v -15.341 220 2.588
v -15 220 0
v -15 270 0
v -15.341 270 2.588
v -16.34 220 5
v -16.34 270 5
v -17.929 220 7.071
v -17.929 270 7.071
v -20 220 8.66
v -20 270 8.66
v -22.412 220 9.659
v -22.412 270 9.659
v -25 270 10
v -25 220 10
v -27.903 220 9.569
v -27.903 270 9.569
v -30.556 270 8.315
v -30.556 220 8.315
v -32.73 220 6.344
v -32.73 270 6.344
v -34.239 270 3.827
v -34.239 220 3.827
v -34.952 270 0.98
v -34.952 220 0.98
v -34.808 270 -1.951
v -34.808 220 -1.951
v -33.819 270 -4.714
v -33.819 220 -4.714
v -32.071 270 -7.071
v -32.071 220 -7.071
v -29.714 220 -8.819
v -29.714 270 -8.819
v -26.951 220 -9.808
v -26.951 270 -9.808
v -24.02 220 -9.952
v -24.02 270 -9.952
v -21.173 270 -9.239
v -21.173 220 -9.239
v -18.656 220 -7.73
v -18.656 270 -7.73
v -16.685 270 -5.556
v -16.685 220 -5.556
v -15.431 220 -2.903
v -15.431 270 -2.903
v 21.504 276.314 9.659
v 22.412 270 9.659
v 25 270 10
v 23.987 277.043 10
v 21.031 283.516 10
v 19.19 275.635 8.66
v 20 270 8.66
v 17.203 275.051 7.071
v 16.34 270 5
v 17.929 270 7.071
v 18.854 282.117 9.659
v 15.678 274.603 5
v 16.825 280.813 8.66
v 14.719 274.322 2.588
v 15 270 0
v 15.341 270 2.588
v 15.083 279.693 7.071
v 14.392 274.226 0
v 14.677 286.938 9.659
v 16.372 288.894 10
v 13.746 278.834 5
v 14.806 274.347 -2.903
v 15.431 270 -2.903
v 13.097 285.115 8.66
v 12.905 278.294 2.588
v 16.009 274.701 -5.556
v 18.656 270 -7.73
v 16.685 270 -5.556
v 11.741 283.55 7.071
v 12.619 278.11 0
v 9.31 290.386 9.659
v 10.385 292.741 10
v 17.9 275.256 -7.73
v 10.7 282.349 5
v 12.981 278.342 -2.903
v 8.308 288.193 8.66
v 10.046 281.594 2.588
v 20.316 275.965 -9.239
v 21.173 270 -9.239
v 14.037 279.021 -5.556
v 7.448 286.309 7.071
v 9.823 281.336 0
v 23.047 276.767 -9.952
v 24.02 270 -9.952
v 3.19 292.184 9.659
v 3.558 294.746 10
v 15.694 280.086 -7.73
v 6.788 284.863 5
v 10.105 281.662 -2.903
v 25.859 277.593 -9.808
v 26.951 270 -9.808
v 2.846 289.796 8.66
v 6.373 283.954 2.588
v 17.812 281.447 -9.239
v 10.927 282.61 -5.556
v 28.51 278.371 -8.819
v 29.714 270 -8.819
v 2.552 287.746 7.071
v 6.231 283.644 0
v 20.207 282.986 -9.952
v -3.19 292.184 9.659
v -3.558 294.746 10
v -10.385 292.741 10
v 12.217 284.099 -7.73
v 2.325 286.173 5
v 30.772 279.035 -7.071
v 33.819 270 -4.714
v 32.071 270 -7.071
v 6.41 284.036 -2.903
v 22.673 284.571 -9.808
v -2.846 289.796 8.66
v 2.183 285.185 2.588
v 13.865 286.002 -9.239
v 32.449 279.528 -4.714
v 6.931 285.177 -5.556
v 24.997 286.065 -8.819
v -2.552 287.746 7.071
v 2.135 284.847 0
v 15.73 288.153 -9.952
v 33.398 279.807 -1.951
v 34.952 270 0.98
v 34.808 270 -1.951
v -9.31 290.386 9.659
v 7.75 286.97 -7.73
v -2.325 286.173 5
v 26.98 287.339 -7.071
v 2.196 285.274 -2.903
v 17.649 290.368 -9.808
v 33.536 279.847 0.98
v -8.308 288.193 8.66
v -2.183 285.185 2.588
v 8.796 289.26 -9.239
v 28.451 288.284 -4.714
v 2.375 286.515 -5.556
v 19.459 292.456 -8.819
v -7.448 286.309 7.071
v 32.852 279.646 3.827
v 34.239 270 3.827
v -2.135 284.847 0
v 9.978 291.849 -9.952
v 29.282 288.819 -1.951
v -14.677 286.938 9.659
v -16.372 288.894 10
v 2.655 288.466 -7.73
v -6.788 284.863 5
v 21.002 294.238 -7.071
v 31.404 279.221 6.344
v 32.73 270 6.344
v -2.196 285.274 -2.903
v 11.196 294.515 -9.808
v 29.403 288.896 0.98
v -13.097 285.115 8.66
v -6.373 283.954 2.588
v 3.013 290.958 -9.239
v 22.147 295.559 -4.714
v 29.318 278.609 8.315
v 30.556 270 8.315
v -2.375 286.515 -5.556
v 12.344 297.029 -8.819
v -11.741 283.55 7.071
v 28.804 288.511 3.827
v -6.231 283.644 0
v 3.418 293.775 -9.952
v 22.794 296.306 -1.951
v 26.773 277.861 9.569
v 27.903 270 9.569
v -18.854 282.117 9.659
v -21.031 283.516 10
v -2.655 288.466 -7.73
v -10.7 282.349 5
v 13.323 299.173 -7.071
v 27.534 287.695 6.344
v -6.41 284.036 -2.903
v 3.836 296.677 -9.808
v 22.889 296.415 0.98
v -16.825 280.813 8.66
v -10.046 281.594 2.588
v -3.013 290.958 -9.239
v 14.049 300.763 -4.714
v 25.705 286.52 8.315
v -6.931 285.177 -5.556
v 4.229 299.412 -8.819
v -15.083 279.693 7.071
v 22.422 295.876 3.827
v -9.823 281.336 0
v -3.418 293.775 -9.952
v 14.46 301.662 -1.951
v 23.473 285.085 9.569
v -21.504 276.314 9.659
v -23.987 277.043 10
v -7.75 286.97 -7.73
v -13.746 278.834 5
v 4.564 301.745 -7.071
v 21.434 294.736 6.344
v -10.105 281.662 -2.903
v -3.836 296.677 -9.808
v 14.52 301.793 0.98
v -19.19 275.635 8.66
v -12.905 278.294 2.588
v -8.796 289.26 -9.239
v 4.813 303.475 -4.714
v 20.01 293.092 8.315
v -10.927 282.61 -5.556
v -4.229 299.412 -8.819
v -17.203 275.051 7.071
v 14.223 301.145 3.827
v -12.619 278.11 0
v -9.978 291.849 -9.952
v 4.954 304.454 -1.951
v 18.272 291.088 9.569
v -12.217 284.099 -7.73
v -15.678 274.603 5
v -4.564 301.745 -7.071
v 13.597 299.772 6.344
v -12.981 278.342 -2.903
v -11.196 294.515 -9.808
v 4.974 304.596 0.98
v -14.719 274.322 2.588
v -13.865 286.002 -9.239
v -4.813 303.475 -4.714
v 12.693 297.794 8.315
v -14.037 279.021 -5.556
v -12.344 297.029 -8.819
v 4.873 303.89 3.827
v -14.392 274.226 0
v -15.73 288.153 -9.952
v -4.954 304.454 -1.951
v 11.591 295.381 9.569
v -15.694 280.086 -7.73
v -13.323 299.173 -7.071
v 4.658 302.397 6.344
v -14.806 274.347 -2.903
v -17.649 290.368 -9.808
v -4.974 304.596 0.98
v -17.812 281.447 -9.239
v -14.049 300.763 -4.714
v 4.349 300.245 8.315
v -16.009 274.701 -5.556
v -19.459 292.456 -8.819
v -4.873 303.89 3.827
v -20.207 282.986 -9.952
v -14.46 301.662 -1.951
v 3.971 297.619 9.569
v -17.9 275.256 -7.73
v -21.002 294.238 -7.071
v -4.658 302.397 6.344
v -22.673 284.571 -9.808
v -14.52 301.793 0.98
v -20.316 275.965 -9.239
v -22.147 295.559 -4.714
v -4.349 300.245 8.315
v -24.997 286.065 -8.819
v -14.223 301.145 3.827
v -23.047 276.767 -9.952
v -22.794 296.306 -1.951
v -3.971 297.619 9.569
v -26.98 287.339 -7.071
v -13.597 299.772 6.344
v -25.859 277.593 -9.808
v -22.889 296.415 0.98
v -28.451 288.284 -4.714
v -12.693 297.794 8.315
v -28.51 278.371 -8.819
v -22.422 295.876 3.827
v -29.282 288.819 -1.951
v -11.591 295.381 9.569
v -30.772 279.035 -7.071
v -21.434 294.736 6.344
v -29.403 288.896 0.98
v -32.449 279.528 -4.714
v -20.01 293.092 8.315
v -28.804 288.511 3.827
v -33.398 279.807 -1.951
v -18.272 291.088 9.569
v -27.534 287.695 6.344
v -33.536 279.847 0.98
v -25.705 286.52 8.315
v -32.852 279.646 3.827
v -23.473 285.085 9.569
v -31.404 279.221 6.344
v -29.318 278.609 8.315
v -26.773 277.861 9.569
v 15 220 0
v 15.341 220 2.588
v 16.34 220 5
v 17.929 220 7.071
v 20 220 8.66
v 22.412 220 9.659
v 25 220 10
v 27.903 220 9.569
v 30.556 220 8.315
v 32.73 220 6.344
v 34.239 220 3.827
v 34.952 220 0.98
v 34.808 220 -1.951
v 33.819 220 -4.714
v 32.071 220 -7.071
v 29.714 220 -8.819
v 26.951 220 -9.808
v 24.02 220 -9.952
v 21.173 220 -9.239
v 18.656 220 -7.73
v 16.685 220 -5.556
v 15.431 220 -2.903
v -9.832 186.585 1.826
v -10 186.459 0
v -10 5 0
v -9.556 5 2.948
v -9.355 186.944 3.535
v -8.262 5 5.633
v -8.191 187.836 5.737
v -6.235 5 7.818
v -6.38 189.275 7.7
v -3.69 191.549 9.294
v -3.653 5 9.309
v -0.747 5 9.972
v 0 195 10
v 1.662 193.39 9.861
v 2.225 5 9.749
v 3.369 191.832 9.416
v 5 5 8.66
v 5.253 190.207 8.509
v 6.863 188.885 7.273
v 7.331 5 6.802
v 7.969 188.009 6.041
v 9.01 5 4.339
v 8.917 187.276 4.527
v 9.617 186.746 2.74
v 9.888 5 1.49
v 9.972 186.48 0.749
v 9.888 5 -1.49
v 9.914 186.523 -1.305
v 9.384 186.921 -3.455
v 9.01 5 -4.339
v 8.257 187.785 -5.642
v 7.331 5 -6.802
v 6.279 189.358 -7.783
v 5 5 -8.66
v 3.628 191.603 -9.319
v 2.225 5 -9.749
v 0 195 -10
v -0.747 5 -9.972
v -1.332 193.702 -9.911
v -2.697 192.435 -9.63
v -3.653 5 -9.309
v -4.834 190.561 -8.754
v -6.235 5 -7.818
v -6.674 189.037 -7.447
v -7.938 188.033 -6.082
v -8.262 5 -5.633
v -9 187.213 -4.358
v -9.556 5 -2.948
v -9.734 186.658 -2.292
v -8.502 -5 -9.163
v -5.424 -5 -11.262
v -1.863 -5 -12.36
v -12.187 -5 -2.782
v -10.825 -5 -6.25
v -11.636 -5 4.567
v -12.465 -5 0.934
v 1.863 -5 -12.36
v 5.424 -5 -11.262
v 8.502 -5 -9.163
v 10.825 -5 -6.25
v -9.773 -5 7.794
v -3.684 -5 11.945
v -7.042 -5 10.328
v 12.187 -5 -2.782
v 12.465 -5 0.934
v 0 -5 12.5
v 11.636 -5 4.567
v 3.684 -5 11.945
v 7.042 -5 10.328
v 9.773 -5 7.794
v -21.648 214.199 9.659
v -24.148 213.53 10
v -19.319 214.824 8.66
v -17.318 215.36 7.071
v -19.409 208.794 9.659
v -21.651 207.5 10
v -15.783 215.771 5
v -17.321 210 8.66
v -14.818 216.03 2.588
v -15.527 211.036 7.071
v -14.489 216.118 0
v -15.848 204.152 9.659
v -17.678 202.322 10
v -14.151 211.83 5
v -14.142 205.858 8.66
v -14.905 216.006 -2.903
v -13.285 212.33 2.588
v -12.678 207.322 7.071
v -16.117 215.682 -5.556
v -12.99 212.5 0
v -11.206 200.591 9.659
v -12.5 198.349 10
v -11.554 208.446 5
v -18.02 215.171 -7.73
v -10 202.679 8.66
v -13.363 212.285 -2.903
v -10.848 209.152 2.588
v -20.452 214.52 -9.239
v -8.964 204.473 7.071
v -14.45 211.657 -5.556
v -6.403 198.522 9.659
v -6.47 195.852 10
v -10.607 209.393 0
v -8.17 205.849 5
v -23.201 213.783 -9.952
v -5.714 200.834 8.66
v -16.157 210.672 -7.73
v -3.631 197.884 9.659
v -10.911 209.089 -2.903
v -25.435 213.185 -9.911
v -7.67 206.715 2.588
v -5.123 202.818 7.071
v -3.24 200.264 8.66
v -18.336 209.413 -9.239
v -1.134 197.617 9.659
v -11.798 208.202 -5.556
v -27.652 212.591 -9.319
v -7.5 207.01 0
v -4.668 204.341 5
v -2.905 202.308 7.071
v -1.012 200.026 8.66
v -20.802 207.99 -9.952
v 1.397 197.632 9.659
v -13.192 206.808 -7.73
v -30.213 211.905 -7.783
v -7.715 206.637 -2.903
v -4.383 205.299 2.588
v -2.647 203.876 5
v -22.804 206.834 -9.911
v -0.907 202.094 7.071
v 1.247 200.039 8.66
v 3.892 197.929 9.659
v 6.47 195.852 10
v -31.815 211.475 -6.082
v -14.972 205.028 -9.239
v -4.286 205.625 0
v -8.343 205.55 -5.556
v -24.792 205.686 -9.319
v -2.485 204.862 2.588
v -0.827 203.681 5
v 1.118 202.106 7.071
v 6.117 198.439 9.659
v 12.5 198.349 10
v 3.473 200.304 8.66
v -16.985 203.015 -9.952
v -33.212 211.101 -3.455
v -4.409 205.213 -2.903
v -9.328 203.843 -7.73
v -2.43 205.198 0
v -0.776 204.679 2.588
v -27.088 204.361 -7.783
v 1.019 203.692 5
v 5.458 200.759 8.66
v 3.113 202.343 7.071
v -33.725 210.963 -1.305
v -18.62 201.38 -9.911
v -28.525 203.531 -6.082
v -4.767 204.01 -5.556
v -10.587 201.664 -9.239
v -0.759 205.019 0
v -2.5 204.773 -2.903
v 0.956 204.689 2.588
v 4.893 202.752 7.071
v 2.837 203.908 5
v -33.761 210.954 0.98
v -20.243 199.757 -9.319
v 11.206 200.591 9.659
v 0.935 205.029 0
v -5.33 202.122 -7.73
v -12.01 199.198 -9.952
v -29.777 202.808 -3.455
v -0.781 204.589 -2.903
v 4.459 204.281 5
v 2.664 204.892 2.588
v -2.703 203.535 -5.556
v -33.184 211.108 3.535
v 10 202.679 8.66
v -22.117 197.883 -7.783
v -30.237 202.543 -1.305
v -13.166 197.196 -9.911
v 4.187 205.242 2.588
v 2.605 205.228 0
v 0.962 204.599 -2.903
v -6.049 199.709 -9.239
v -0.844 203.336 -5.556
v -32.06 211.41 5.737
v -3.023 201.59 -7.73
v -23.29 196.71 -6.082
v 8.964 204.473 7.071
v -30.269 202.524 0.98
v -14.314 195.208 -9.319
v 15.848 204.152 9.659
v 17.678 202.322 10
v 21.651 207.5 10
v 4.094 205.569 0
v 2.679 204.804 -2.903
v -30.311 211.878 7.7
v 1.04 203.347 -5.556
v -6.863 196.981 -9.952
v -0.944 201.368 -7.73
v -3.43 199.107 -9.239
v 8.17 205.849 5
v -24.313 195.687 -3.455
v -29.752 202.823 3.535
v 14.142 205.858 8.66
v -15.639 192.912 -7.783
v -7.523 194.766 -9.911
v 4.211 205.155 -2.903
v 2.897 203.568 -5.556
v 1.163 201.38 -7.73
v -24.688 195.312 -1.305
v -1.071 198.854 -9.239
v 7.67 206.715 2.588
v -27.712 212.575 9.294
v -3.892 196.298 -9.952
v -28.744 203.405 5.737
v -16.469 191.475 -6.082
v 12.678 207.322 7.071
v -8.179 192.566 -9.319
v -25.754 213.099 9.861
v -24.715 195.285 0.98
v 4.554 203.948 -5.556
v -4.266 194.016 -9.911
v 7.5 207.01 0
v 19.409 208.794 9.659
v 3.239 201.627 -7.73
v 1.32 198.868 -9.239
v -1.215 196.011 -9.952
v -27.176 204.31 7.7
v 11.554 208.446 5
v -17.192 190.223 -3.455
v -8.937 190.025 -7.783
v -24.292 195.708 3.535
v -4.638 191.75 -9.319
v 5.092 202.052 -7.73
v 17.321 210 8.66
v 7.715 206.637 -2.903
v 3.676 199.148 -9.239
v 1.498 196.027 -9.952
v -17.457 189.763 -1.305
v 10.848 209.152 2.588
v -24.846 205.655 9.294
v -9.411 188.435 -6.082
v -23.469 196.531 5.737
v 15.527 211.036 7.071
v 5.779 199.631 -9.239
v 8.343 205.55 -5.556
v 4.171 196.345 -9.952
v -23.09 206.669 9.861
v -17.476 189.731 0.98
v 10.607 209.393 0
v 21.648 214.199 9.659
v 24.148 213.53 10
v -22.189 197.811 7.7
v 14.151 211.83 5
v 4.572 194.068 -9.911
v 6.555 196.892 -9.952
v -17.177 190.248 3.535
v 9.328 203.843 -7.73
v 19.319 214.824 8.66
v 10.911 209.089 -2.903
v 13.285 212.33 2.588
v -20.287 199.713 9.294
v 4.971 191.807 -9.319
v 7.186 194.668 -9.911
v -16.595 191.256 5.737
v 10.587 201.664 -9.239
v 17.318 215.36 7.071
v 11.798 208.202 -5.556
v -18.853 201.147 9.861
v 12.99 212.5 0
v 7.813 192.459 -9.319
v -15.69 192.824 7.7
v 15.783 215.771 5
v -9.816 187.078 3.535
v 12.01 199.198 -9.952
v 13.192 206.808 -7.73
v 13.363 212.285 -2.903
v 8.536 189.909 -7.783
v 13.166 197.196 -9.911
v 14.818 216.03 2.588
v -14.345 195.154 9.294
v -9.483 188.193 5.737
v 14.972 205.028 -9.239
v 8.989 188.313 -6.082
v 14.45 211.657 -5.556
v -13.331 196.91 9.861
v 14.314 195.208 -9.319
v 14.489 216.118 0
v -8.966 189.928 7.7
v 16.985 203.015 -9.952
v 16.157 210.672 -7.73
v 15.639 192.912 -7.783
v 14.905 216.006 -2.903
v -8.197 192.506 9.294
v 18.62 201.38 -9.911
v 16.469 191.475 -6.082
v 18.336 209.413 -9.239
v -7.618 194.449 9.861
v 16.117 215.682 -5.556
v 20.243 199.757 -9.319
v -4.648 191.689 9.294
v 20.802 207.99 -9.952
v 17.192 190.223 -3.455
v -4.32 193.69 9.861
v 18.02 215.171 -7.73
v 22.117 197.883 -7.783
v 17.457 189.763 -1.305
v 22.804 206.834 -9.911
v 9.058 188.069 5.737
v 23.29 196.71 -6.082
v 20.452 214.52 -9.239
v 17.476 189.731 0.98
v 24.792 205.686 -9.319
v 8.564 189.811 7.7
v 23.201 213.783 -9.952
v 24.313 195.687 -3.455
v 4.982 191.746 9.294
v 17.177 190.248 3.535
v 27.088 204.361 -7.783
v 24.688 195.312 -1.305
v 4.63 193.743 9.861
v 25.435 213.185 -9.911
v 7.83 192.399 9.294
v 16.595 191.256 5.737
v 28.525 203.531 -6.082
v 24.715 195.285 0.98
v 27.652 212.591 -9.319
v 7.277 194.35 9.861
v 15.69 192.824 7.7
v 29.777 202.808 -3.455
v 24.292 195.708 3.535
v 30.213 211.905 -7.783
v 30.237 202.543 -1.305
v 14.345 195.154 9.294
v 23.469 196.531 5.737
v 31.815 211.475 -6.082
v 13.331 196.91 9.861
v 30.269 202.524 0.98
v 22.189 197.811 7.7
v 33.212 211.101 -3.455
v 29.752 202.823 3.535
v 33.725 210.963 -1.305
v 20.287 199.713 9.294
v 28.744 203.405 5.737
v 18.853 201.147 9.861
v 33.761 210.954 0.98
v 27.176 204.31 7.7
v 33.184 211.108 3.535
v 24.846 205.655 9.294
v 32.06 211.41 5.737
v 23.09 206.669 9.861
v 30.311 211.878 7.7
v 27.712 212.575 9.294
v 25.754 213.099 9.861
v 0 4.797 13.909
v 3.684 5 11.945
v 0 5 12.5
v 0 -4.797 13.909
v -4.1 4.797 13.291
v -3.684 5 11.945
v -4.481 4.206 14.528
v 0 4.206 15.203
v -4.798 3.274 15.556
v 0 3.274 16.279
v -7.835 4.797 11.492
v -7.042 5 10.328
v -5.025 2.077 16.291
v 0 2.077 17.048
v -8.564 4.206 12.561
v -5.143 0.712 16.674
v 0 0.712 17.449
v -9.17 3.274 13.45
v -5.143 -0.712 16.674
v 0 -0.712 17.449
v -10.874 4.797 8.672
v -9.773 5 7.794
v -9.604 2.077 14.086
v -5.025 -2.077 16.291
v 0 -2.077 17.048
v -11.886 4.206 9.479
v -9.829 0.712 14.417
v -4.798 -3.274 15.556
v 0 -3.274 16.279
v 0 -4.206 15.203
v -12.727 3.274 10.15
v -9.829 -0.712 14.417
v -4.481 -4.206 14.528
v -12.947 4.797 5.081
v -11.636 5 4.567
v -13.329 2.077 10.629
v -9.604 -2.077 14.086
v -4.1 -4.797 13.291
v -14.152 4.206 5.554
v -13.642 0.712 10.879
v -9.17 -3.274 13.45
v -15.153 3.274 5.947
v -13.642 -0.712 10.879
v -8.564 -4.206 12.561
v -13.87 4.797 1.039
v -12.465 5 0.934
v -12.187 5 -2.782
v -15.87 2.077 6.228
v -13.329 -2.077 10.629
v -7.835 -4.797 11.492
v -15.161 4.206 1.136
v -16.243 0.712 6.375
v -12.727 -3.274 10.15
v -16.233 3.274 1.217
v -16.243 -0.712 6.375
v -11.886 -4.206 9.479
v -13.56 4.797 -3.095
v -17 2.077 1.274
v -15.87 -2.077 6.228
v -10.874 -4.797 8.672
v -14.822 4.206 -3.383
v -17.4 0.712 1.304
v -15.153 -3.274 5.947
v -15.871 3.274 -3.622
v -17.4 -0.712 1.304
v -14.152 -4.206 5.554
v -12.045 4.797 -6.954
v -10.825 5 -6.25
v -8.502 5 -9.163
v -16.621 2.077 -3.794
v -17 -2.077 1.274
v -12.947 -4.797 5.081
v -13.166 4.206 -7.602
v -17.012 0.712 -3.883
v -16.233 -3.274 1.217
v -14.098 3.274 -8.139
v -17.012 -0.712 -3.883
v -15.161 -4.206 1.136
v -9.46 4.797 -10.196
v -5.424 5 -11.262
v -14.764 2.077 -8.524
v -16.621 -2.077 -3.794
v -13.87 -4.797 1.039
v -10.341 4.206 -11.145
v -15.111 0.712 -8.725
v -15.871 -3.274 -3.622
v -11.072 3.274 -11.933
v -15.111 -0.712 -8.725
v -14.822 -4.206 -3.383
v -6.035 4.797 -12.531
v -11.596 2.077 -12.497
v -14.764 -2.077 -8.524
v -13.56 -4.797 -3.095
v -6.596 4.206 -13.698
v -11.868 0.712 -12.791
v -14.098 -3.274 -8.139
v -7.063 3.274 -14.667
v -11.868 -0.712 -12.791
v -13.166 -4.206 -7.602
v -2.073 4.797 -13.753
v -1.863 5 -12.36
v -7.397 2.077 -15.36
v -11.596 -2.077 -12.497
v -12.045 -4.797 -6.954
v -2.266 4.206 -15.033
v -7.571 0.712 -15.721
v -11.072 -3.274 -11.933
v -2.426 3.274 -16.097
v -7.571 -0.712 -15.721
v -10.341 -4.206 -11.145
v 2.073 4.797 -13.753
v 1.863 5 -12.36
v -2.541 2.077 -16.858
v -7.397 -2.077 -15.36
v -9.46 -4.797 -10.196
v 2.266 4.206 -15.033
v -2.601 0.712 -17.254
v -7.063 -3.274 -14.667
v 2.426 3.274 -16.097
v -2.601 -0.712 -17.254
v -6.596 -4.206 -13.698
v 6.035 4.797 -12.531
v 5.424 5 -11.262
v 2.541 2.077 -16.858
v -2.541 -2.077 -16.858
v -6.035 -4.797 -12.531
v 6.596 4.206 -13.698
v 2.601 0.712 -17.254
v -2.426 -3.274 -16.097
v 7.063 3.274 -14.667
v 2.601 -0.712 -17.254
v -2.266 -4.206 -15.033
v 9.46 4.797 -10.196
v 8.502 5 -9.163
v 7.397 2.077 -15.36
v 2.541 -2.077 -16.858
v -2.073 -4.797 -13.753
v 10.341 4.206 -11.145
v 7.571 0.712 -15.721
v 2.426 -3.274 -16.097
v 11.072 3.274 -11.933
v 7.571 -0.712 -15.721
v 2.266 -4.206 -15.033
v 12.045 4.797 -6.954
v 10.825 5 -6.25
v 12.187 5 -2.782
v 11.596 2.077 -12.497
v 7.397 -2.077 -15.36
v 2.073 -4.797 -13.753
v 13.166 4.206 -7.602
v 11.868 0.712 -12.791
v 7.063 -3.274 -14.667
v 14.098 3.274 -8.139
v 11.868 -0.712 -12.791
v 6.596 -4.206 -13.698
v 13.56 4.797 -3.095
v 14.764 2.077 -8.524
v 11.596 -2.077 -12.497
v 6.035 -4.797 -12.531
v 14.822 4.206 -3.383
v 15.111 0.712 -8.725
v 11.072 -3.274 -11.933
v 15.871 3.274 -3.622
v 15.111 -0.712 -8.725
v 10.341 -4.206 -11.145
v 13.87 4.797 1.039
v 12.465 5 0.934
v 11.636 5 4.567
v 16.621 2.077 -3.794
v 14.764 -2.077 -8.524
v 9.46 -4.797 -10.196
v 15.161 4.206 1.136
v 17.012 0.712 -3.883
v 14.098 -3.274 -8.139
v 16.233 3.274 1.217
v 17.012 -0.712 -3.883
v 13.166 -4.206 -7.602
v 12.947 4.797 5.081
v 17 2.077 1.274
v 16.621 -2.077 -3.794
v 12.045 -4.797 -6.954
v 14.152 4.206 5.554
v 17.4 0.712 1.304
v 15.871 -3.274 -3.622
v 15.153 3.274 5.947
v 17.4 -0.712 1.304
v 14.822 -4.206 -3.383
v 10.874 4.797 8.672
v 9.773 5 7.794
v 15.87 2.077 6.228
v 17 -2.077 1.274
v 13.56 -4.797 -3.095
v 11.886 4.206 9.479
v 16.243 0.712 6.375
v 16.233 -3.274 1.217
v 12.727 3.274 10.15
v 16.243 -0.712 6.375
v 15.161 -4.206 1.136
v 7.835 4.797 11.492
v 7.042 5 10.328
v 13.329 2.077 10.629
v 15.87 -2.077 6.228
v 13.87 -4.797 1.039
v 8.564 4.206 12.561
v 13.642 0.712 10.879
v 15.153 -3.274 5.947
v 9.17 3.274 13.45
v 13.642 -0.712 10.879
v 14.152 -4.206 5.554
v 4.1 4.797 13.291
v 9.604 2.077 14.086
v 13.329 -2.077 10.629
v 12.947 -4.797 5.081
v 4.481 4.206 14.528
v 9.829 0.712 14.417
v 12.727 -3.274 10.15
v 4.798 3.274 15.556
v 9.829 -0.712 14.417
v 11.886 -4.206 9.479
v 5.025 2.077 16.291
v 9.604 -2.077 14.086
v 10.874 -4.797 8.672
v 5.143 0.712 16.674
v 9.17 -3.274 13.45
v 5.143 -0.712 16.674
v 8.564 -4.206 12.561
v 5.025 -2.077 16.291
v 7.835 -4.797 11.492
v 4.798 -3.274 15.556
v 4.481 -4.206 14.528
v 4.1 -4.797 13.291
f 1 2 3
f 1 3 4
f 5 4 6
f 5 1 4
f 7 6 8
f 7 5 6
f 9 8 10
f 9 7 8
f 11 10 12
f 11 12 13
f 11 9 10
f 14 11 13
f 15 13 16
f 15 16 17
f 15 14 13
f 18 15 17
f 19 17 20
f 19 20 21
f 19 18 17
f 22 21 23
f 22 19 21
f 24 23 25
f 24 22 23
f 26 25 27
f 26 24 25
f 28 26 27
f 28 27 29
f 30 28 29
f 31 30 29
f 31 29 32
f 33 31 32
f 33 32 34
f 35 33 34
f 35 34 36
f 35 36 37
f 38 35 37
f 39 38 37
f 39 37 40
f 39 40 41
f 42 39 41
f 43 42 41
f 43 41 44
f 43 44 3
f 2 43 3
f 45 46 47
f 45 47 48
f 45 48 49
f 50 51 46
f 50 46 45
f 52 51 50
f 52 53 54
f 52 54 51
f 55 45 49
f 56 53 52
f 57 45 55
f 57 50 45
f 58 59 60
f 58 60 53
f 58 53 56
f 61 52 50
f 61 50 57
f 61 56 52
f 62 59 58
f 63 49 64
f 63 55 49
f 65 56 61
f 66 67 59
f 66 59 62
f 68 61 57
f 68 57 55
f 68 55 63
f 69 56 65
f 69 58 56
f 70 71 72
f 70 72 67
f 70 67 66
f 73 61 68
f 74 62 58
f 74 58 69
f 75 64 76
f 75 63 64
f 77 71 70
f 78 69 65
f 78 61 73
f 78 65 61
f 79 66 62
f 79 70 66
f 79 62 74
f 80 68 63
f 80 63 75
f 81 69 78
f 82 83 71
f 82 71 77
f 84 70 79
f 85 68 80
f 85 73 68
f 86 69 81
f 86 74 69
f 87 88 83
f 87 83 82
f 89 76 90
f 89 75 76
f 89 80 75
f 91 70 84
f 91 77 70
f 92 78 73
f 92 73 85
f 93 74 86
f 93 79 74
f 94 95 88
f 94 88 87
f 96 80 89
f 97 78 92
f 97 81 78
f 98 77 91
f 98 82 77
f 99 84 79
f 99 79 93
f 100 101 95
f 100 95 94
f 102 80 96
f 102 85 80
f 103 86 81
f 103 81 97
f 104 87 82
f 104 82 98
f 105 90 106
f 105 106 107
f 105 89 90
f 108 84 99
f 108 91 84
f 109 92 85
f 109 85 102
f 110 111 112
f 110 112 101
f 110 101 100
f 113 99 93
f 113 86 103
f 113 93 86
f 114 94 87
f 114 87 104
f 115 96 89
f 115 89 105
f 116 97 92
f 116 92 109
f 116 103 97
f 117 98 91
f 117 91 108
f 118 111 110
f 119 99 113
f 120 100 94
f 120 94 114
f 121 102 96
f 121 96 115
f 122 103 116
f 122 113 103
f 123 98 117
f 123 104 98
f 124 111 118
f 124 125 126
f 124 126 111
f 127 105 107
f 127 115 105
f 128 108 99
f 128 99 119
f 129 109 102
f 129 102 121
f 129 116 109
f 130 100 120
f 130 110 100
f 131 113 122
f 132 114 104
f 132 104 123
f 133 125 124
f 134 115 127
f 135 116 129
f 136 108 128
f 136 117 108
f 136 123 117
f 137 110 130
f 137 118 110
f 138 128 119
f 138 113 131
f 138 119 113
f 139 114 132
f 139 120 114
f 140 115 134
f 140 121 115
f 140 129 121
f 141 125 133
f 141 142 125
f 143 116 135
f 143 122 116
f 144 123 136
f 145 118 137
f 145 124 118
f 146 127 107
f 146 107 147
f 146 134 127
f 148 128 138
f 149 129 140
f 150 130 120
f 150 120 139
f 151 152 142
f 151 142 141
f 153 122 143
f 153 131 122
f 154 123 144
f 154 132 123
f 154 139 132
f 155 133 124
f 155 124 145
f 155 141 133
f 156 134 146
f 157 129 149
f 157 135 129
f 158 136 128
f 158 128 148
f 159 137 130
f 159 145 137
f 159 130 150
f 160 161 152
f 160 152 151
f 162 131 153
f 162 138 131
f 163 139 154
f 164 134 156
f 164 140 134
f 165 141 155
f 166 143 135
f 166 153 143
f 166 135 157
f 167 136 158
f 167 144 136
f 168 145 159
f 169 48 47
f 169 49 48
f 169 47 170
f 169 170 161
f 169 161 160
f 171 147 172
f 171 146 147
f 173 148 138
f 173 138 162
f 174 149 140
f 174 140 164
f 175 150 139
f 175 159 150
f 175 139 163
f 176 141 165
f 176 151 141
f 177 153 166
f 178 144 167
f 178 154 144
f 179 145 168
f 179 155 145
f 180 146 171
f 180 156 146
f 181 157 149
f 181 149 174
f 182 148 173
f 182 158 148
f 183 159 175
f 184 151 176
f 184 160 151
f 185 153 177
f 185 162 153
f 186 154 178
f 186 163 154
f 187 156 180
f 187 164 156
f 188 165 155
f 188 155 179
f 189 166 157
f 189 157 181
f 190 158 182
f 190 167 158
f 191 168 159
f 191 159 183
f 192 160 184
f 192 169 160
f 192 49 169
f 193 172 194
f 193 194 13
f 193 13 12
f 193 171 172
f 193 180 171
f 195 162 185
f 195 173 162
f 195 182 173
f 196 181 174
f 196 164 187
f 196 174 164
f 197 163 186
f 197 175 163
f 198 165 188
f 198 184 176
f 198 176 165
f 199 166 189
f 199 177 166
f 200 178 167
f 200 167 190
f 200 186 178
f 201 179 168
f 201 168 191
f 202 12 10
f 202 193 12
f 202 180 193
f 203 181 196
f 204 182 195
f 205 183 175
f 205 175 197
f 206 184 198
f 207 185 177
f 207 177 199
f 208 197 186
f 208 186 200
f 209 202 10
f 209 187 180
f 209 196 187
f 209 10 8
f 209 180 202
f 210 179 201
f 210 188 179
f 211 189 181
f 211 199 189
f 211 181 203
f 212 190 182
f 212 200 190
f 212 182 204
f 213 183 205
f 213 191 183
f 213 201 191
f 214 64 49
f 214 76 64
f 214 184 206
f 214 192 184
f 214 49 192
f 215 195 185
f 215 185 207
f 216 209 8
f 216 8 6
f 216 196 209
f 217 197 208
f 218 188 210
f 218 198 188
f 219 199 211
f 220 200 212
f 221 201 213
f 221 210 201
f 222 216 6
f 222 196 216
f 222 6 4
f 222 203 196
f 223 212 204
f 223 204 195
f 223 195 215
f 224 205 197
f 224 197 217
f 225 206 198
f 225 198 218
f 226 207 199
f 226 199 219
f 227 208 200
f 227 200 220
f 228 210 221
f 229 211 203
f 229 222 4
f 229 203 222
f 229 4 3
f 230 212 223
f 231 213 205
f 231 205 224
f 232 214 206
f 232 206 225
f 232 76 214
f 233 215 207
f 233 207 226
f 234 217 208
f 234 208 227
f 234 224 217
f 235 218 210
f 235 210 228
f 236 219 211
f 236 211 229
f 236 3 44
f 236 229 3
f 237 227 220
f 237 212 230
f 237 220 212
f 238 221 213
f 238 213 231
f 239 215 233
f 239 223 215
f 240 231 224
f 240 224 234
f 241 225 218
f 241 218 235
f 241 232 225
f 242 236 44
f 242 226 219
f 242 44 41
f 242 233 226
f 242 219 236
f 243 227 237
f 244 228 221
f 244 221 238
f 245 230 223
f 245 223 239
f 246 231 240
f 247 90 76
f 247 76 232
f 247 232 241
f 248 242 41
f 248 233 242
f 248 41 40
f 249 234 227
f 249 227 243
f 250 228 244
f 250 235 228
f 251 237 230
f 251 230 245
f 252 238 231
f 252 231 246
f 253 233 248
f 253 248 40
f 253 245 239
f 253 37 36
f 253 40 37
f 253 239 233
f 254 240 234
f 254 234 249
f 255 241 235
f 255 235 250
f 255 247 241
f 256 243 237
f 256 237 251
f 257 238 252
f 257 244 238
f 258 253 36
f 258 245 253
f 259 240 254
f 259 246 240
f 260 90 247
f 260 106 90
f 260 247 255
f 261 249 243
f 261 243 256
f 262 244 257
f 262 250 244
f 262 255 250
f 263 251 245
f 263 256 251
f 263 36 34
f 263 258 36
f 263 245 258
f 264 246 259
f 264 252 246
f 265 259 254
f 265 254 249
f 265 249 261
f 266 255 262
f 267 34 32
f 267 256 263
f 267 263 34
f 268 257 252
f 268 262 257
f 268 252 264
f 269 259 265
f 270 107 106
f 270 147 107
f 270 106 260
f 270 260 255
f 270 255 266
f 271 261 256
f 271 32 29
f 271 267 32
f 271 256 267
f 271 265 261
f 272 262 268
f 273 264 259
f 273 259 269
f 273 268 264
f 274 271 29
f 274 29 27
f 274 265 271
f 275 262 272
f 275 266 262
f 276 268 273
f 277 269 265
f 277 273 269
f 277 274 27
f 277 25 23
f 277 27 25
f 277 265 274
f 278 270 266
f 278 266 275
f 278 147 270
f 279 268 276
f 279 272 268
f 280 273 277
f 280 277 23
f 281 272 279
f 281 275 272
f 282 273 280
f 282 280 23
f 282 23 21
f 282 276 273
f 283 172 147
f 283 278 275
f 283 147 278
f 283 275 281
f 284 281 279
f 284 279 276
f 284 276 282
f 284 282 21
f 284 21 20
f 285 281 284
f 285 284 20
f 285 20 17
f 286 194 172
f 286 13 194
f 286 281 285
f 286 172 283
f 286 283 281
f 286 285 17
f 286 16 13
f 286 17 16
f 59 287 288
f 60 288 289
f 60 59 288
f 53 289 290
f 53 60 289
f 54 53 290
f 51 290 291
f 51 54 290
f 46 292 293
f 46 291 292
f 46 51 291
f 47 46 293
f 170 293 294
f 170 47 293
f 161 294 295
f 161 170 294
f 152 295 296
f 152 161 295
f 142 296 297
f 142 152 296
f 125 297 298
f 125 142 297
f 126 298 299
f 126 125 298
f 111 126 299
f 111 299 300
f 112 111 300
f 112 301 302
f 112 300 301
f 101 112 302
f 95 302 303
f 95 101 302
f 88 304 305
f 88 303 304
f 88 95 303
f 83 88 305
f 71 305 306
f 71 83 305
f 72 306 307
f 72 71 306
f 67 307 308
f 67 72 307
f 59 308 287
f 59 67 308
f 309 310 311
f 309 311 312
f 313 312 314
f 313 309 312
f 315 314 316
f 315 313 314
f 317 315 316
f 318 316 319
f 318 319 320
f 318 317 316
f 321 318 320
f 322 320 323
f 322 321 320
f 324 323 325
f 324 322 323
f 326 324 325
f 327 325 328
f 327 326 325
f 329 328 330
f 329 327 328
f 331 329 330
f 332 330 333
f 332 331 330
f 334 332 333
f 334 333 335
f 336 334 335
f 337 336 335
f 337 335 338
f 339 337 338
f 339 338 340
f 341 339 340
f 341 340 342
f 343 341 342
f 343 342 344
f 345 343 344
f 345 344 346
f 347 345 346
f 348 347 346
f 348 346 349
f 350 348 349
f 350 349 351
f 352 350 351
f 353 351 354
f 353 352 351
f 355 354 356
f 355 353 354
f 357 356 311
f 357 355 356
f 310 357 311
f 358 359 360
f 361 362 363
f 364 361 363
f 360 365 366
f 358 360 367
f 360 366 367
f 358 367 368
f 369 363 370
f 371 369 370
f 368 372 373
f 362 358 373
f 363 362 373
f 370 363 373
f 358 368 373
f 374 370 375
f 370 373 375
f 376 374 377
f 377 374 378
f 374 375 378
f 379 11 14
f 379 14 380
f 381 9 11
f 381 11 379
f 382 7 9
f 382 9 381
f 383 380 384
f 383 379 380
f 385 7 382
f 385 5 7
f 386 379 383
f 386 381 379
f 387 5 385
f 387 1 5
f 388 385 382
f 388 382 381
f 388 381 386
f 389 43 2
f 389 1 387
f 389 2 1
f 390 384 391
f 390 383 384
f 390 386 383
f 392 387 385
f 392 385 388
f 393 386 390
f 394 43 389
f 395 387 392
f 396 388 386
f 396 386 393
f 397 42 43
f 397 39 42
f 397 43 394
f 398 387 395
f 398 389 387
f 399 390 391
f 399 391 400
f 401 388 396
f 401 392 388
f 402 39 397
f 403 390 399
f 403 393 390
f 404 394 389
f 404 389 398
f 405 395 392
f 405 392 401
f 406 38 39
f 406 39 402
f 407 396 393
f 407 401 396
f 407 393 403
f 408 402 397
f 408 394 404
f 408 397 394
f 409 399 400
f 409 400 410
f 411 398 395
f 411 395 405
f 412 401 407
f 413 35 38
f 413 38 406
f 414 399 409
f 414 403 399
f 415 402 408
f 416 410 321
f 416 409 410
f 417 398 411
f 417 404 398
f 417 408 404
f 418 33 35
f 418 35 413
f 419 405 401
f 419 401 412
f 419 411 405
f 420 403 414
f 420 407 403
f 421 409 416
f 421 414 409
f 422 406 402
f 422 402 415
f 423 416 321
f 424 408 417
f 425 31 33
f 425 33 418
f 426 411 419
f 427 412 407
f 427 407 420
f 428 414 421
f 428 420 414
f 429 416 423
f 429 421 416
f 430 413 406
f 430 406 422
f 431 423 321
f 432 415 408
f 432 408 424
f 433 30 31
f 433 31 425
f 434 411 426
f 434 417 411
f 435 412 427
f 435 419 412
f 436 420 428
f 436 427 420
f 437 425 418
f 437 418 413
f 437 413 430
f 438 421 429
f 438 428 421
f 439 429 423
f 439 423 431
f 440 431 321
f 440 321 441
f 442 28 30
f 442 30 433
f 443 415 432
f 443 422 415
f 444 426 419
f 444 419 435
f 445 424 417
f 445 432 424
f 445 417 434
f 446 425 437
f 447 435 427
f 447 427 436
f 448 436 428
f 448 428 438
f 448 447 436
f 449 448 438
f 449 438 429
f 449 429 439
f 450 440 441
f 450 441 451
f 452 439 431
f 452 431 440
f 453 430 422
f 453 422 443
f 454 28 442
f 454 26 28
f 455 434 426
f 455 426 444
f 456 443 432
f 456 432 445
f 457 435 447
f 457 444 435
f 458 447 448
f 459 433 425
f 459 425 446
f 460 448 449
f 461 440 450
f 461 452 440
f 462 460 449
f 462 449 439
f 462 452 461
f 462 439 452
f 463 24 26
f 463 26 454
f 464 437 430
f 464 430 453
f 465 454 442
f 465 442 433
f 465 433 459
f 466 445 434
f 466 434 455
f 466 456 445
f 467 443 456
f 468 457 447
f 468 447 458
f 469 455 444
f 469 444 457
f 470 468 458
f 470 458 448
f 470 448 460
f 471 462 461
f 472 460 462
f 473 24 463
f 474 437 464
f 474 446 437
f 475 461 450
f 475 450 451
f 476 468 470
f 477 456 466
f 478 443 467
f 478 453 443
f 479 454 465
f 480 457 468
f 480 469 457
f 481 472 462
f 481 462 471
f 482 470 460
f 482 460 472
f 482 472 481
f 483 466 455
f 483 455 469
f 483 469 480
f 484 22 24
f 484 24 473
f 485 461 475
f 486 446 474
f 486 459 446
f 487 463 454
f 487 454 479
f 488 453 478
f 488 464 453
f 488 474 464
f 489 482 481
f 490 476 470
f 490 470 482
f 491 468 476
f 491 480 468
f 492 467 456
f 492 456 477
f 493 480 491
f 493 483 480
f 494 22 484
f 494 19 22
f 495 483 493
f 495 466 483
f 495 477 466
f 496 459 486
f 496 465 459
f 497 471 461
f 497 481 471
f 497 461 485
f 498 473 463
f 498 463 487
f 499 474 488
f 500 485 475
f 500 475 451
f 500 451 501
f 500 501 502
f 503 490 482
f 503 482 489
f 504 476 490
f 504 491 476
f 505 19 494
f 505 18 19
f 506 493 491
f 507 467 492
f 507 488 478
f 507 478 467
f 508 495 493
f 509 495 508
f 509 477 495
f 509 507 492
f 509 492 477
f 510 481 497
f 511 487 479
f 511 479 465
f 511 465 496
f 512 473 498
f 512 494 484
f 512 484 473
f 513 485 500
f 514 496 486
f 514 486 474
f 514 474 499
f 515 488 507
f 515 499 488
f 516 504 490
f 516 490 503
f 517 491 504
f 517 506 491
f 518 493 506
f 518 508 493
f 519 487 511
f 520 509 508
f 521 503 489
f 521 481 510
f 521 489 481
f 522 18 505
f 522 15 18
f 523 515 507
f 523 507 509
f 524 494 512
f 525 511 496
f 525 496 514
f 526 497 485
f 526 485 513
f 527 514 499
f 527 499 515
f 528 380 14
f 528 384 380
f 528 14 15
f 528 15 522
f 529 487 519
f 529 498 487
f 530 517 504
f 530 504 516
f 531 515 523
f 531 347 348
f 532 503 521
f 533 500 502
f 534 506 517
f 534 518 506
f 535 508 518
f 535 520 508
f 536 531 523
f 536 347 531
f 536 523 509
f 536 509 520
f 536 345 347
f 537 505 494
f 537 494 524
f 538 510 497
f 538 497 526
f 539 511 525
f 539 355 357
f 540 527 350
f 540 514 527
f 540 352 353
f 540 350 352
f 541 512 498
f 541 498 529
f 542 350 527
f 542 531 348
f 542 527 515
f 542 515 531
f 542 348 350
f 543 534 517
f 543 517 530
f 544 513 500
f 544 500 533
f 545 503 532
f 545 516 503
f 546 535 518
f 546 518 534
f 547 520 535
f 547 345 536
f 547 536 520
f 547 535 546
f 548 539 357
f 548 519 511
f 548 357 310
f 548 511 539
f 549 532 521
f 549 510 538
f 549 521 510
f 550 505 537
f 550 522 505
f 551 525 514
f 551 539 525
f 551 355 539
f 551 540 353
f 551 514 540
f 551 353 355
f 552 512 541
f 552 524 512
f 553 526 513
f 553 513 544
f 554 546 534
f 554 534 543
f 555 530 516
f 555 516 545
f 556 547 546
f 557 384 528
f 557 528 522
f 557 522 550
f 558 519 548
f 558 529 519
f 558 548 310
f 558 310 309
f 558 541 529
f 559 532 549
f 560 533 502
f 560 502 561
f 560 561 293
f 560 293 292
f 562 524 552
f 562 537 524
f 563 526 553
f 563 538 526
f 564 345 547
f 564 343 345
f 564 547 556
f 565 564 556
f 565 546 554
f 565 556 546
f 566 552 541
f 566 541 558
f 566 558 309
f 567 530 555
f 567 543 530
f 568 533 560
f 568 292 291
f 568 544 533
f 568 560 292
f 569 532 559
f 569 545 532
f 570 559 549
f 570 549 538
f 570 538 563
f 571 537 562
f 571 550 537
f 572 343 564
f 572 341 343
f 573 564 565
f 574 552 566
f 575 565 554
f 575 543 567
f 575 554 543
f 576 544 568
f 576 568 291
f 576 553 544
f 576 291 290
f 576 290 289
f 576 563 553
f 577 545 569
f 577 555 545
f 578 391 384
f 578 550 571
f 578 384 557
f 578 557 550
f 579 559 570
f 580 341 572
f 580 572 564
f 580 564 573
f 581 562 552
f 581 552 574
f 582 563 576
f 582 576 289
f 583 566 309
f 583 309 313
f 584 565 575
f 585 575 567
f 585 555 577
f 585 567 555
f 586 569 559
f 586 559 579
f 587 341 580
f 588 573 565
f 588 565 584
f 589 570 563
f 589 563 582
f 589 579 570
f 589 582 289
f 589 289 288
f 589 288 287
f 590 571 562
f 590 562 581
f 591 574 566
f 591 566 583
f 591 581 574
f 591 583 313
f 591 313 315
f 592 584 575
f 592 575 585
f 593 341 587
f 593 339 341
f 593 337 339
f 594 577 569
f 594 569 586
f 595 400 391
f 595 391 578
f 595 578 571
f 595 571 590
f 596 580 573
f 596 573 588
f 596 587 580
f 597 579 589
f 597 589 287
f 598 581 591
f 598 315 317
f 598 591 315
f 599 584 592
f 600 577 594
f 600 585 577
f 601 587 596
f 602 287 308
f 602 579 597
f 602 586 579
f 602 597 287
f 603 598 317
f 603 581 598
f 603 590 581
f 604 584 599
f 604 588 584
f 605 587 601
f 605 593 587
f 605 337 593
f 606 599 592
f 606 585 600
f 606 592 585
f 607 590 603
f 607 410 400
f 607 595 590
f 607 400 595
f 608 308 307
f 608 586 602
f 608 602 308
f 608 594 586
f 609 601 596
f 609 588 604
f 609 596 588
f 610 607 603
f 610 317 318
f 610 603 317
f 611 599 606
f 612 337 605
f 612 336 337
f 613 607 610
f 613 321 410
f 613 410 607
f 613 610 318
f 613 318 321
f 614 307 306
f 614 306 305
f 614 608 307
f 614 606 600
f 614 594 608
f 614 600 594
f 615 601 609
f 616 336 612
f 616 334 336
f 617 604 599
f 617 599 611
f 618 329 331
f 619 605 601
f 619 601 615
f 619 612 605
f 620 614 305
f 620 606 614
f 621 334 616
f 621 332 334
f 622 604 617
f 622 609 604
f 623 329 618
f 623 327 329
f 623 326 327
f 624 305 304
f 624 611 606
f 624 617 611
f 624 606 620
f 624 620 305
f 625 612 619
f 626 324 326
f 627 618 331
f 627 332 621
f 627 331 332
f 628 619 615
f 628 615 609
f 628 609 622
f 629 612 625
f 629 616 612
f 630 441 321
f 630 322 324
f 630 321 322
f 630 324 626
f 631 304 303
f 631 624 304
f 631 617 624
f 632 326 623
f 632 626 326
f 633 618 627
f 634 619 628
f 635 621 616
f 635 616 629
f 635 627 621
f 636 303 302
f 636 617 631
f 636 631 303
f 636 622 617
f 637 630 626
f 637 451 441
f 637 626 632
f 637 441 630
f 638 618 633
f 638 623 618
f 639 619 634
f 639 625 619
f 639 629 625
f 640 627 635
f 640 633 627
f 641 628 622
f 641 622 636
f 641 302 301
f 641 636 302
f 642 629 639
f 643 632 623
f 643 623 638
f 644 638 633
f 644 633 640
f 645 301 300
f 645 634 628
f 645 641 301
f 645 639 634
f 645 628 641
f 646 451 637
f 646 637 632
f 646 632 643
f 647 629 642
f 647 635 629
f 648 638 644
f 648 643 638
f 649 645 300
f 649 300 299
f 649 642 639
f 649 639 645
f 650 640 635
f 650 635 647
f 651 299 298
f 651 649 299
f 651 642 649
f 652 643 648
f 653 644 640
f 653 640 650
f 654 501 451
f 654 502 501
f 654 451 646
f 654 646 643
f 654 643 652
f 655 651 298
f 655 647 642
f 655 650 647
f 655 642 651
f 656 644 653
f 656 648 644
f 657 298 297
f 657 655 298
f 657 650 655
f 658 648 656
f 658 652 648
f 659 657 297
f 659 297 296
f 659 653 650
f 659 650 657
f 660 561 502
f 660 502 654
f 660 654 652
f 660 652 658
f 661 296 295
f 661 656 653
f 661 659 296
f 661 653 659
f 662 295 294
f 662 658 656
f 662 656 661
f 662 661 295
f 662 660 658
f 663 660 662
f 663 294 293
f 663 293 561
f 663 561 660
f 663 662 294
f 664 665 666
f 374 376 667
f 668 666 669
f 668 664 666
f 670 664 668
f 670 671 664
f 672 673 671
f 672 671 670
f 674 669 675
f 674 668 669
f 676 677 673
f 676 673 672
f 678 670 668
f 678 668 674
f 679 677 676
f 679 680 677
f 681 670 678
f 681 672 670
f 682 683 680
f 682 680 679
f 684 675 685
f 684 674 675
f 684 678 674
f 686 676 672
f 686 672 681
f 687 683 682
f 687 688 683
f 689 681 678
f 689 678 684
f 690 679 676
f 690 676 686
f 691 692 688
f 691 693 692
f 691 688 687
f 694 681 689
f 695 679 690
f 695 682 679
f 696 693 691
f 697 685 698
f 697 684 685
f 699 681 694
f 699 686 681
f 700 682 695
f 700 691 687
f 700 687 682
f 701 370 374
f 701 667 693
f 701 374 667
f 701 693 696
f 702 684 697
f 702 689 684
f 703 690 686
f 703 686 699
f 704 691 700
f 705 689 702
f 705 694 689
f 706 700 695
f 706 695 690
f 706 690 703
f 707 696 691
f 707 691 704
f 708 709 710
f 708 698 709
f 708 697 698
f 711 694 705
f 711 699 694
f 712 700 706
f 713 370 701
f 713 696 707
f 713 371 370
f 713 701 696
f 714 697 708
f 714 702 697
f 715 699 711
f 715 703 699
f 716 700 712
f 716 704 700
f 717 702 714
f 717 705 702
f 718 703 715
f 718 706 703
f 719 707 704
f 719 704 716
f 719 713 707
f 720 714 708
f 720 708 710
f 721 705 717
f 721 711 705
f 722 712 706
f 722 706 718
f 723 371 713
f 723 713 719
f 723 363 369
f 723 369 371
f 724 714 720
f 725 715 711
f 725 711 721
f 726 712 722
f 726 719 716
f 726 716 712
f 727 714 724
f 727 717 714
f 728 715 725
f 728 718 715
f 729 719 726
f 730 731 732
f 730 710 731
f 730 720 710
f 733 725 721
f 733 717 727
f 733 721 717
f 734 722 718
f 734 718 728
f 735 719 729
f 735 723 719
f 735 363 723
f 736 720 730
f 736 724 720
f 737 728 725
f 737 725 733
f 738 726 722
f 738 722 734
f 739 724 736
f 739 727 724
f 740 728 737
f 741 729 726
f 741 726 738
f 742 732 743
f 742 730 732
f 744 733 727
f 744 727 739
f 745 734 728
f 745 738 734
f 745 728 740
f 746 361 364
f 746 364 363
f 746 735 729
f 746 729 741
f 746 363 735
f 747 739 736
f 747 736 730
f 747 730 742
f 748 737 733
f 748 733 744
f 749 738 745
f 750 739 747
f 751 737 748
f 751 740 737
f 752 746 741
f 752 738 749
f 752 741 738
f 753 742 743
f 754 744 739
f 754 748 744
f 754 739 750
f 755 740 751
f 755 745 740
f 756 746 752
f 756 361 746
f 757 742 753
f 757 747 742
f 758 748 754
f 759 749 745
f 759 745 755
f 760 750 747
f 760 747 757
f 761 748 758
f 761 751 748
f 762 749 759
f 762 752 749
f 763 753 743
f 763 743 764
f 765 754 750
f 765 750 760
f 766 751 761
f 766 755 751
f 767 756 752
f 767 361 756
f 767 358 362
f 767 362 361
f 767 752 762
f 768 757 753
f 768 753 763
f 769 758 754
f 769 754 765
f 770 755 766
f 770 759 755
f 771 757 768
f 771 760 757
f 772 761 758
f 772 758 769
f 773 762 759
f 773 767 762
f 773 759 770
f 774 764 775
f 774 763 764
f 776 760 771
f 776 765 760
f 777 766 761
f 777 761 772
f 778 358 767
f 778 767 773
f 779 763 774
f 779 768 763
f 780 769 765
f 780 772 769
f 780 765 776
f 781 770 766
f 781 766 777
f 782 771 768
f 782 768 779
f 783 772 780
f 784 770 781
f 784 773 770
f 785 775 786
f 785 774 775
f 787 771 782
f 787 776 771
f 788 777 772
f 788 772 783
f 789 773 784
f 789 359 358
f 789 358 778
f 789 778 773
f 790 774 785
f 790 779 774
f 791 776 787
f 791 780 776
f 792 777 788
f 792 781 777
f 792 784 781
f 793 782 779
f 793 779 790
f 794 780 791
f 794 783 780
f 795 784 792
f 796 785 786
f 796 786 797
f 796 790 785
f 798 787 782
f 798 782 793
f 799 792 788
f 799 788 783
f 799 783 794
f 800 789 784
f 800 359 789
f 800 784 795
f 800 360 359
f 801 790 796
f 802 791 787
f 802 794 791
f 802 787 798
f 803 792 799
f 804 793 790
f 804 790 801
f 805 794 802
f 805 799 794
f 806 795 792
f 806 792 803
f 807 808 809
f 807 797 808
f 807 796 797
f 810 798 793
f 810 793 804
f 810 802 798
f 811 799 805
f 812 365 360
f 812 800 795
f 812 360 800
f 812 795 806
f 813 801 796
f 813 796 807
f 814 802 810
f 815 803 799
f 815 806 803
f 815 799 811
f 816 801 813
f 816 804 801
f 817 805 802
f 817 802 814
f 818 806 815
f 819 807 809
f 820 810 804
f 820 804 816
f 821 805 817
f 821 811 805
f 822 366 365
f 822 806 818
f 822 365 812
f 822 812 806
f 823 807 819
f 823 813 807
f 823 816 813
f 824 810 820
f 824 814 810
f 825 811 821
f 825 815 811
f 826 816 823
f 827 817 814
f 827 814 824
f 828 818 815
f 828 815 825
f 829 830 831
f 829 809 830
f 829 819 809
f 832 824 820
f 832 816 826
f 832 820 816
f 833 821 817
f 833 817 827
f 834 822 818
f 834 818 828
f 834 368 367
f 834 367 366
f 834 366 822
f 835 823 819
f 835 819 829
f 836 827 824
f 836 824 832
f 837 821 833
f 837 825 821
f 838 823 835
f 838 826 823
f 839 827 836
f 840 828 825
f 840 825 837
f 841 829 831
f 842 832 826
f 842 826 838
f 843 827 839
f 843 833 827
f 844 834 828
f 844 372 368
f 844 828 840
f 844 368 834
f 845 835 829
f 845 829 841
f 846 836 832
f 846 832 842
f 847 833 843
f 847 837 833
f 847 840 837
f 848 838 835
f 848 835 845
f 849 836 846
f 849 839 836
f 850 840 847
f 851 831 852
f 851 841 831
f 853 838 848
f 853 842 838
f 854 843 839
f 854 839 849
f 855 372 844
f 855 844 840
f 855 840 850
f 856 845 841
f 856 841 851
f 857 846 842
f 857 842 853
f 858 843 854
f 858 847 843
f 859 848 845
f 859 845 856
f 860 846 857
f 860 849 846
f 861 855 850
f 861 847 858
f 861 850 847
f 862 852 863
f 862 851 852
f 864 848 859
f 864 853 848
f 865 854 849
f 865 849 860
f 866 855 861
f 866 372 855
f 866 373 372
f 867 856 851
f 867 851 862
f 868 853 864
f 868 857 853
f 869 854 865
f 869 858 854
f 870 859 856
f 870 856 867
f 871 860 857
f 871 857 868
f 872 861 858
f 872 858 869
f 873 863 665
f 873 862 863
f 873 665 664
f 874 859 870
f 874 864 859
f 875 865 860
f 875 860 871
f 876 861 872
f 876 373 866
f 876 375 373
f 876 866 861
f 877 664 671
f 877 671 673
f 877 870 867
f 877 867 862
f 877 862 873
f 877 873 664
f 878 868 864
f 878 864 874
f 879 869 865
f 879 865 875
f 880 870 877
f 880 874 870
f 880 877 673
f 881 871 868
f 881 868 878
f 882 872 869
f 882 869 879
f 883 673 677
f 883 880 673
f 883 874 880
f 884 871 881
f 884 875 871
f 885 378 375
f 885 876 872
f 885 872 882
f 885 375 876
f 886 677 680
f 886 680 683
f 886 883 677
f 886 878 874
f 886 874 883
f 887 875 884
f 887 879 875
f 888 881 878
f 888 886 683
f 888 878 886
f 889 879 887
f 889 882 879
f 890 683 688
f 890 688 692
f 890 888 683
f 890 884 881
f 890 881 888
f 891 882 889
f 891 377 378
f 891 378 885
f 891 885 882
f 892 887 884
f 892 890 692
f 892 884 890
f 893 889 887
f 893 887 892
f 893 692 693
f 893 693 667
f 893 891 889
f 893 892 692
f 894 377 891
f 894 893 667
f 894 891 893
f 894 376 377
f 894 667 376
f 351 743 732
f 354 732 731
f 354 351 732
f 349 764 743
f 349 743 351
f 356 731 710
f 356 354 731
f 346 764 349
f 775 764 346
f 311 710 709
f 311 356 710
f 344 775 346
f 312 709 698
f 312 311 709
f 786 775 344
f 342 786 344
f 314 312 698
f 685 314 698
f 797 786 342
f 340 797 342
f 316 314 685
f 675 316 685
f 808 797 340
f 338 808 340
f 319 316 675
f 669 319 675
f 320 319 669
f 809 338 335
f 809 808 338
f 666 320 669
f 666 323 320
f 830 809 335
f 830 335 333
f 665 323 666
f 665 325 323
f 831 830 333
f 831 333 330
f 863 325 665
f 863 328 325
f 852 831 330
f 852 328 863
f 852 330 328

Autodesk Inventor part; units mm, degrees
ref_plane "YZ Plane" through (0, 0, 0) normal (1, 0, 0) x (0, 1, 0)
ref_plane "XZ Plane" through (0, 0, 0) normal (0, 1, 0) x (-1, 0, 0)
ref_plane "XY Plane" through (0, 0, 0) normal (0, 0, 1) x (1, 0, 0)
sketch "Sketch1" plane through (0, 0, 0) normal (0, 0, 1) x (1, 0, 0)
  line L0 (0, 0) -> (0, 195)
  line L1 (0, 195) -> (0, 295) construction
  line L2 (25, 220) -> (25, 270)
  line L3 (-25, 270) -> (-25, 220)
  arc A0 (-25, 220) -> (25, 220) centre (0, 220) ccw
  arc A1 (25, 270) -> (-25, 270) centre (0, 270) ccw
  point P0 (0, 245)
  dimension "d0" = 195
  dimension "d1" = 100
  dimension "d2" = 50
sketch "Sketch2" plane through (0, 0, 0) normal (0, 1, 0) x (-1, 0, 0)
  circle A0 centre (0, 0) radius 10
  dimension "d3" = 20
sweep "Sweep1" add profiles "Sketch2" path "Sketch1" path curves L0
sketch "Sketch3" plane through (0, 0, 0) normal (1, 0, 0) x (0, 1, 0)
  line L0 (195, -10) -> (195, 10) projected
  circle A0 centre (195, 0) radius 10
  point P0 (0, 0)
  dimension "d6" = 20
sweep "Sweep2" add profiles "Sketch3" path "Sketch1" path curves A0 L3 A1 L2
sketch "Sketch4" plane through (0, 0, 0) normal (1, 0, 0) x (0, 1, 0)
  line L0 (0, 12.5) -> (0, -12.5) construction
  line L1 (5, 12.5) -> (5, -12.5)
  line L2 (-5, -12.5) -> (-5, 12.5)
  arc A0 (5, 12.5) -> (-5, 12.5) centre (0, 12.5) ccw
  arc A1 (-5, -12.5) -> (5, -12.5) centre (0, -12.5) ccw
  line L3 (-5, 0) -> (5, 0)
  point P0 (0, 0)
  dimension "d9" = 25
  dimension "d10" = 5
revolve "Revolution1" add sketch "Sketch4" angle 360 about axis through (0, -5, 0) along (0, 1, 0) contours L1 L3 L2 A0
properties part number "Elo-Bola Longo"
